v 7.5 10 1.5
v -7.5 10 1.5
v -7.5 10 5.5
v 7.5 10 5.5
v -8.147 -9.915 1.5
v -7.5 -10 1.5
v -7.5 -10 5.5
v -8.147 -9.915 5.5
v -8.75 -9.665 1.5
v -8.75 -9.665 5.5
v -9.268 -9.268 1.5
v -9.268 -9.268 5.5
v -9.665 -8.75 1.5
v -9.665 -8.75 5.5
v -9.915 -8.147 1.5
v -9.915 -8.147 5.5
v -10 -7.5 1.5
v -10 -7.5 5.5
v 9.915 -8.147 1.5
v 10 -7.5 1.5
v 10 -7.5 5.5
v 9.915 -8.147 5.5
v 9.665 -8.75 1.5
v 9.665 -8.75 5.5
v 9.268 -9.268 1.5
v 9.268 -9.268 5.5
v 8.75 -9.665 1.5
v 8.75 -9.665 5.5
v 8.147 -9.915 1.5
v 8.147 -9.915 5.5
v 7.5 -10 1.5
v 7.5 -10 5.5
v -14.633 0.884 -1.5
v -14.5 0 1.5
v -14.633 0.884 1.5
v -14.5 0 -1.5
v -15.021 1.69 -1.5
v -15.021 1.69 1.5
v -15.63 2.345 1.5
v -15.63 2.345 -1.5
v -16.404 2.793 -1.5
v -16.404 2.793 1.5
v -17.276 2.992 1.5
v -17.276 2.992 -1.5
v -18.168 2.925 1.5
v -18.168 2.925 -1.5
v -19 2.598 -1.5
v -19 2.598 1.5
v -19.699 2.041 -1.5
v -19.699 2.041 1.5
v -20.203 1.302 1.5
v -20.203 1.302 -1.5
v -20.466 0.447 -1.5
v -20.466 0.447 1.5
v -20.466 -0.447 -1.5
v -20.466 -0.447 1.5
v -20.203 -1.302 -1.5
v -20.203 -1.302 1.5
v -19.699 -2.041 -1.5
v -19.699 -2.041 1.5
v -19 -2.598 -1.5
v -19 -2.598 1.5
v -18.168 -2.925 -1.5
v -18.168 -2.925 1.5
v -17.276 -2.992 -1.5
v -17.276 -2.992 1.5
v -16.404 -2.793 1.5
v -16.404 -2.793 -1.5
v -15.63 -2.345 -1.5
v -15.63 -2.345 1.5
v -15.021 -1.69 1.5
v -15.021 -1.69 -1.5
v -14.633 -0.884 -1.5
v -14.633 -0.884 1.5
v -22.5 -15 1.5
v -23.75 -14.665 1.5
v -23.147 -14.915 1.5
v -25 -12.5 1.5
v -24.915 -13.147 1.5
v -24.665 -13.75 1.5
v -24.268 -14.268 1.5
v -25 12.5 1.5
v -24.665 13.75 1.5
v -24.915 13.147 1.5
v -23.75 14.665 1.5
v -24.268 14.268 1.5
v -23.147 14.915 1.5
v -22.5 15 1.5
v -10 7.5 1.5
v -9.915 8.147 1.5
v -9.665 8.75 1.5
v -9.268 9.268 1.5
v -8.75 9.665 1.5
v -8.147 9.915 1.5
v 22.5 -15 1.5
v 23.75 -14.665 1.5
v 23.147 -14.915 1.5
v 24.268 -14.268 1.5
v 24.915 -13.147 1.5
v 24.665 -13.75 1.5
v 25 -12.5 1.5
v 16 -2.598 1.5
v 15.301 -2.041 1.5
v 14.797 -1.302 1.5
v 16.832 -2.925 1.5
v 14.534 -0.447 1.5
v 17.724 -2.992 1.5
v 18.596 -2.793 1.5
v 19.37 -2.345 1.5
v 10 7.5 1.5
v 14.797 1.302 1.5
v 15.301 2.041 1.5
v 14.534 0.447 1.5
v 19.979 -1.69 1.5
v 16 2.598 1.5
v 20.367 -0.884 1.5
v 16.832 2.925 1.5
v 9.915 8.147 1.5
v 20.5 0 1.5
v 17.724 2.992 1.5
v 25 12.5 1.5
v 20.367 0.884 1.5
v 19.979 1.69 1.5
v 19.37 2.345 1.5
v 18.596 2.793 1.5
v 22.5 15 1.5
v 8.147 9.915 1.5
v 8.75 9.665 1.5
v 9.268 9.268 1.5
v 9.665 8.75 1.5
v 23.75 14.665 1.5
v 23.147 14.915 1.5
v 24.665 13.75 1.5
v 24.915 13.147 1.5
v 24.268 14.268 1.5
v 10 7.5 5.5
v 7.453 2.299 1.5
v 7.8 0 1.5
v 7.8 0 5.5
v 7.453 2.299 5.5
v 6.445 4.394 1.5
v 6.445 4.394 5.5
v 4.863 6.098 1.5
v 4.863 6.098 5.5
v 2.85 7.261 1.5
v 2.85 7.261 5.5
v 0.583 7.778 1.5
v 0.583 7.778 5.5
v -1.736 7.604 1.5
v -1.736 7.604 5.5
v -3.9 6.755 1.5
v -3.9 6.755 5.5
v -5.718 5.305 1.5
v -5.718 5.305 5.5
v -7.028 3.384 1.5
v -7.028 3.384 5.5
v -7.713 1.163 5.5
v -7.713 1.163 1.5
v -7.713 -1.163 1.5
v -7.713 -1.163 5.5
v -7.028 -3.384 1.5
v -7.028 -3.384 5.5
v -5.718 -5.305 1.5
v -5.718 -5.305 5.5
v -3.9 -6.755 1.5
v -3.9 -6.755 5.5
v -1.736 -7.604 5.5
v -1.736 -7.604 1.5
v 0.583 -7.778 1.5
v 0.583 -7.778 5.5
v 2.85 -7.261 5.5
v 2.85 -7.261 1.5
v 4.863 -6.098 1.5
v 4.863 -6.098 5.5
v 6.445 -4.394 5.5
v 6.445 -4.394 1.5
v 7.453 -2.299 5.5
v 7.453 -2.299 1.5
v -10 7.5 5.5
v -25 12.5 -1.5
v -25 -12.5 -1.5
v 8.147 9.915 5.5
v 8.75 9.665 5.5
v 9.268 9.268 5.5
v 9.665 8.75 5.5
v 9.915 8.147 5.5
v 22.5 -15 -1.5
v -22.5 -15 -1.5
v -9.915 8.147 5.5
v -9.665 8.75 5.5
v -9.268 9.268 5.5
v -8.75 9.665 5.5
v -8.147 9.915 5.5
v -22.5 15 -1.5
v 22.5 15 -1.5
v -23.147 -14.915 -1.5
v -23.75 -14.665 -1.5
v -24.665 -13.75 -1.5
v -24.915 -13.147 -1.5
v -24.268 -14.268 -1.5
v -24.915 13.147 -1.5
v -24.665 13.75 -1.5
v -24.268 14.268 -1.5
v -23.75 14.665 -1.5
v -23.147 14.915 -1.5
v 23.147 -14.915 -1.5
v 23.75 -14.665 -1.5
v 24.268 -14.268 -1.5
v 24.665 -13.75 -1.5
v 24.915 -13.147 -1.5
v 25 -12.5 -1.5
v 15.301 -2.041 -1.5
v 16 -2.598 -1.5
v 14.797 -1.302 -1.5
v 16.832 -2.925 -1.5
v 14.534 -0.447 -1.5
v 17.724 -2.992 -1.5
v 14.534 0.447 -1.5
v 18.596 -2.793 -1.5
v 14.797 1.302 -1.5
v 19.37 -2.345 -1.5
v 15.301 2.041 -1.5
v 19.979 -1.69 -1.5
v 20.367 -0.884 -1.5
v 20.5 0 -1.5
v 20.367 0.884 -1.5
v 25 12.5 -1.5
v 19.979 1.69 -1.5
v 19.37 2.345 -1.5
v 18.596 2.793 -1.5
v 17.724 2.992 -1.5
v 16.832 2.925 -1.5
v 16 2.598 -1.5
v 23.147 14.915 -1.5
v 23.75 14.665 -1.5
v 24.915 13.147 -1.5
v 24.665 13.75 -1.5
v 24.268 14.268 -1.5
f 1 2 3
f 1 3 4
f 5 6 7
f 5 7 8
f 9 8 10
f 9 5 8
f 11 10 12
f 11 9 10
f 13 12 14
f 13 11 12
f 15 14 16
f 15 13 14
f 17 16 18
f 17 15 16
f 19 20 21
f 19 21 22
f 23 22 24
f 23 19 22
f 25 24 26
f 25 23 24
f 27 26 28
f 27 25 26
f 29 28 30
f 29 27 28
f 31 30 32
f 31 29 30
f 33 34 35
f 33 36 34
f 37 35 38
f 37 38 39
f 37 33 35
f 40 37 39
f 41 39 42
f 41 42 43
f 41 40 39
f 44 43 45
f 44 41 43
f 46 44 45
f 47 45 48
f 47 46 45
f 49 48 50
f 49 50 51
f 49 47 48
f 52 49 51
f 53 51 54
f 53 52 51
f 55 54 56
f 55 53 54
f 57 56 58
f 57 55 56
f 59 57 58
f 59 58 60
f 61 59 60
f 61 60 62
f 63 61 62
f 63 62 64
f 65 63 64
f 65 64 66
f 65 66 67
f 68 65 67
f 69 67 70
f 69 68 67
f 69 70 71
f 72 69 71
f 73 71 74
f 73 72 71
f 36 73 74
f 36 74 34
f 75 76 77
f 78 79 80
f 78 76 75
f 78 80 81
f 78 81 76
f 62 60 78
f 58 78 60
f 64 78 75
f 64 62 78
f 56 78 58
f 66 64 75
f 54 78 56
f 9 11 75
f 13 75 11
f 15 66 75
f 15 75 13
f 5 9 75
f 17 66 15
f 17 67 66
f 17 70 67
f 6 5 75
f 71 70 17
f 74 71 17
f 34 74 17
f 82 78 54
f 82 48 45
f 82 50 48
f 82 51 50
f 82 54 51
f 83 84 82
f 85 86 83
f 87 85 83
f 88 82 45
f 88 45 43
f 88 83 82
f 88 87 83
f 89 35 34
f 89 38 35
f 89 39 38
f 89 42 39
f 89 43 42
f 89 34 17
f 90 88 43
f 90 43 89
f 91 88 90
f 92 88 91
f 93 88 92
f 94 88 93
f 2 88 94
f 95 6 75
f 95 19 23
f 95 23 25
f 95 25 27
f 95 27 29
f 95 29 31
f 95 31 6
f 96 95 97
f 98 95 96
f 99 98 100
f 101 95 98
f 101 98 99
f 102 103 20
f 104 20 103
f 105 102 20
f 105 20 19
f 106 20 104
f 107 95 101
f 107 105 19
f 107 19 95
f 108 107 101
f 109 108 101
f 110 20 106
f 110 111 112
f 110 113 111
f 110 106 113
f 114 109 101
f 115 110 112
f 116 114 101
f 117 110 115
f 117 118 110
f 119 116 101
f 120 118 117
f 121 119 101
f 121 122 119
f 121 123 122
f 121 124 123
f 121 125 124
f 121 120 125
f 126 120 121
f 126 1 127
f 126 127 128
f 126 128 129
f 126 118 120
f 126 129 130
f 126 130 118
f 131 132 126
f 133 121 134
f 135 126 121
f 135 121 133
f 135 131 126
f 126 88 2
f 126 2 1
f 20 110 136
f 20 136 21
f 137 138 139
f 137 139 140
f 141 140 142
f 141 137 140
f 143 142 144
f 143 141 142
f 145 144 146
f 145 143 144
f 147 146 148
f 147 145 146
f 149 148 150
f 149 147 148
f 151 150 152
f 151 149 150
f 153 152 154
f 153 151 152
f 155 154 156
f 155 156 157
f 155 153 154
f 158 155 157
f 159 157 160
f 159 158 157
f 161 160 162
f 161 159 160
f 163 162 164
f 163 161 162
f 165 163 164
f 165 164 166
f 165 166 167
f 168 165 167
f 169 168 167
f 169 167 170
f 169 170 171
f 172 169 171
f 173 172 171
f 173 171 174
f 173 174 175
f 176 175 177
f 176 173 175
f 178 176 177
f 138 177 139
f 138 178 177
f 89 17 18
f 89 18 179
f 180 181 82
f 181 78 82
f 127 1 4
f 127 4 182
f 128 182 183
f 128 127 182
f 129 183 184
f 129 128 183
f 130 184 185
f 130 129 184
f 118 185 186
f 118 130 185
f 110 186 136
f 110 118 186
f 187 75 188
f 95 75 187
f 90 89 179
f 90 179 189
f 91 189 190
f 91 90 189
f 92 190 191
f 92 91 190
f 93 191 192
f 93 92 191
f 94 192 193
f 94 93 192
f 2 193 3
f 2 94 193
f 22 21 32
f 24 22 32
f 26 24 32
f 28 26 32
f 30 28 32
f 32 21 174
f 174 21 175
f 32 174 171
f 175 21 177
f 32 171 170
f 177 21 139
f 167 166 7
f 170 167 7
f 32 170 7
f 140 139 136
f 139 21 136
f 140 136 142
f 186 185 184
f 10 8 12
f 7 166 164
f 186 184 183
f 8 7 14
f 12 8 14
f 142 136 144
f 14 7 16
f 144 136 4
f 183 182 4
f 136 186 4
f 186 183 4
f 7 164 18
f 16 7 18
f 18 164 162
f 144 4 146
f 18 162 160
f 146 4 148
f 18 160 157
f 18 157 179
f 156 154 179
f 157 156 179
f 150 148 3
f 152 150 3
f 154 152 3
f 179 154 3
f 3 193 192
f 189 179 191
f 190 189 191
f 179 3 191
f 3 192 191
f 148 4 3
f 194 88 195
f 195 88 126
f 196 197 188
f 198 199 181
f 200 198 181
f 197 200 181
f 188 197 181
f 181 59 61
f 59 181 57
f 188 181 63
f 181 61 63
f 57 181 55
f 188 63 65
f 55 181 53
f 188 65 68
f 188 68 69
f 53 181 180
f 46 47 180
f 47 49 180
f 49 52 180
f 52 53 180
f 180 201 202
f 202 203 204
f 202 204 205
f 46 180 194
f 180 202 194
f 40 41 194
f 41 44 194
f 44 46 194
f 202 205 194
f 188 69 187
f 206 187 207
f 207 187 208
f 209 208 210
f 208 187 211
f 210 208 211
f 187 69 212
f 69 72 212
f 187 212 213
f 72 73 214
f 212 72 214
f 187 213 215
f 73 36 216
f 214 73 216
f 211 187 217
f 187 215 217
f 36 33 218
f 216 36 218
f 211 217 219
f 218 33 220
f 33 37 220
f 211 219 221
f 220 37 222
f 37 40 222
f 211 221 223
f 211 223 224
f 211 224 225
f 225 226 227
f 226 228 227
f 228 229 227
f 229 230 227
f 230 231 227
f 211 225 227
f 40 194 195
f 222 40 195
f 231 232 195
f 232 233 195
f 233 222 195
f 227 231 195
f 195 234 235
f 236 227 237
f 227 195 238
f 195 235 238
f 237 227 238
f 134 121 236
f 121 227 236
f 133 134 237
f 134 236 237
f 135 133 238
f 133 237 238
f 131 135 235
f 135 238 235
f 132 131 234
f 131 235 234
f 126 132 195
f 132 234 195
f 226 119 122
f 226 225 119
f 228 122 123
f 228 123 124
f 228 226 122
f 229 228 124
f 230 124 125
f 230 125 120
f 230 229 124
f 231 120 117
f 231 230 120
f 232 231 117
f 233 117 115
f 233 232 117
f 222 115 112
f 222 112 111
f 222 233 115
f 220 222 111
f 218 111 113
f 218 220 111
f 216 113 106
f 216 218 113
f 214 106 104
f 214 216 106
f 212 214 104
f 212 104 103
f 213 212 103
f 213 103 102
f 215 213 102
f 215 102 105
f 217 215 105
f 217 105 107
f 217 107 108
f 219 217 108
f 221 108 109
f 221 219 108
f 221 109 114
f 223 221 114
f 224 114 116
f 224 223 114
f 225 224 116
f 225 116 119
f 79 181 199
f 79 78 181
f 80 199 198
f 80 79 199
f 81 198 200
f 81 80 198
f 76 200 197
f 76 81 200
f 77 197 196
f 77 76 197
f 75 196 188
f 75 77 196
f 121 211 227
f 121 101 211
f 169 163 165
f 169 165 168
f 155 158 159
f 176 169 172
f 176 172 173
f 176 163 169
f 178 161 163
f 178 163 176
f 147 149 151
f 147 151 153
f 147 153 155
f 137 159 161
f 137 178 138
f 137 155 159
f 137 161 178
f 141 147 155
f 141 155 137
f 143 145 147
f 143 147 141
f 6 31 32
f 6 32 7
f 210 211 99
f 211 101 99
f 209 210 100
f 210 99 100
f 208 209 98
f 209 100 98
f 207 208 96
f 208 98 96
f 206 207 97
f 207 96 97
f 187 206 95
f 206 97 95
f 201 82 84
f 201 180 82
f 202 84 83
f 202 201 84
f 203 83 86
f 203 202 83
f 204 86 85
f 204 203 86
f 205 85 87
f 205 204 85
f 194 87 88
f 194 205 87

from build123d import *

# Parameters (mm, degrees)
SKETCH1_W           = 50
SKETCH1_H           = 30
SKETCH1_R           = 3
BOSS_EXTRUDE1_DEPTH = 1.5
FILLET1_R           = 2.5
SKETCH2_R           = 7.8
BOSS_EXTRUDE2_DEPTH = 4


with BuildPart() as part:
    # Sketch1 → Boss-Extrude1 (new body, symmetric)
    with BuildSketch(Plane.XY):
        Rectangle(SKETCH1_W, SKETCH1_H)
        with Locations((-17.5, 0)):
            Circle(SKETCH1_R, mode=Mode.SUBTRACT)
        with Locations((17.5, 0)):
            Circle(SKETCH1_R, mode=Mode.SUBTRACT)
    extrude(amount=BOSS_EXTRUDE1_DEPTH, both=True)

    # Fillet1
    fillet1_edges = [part.edges().sort_by_distance(p)[0] for p in [
        (-25, 15, 0),
        (25, 15, 0),
        (25, -15, 0),
        (-25, -15, 0),
    ]]
    fillet(fillet1_edges, radius=FILLET1_R)

    # Sketch2 → Boss-Extrude2 (add)
    with BuildSketch(Plane.XY.offset(1.5)):
        with BuildLine():
            Line((7.5, -10), (-7.5, -10))
            ThreePointArc((-7.5, -10), (-9.267766953, -9.267766953), (-10, -7.5))
            Line((-10, -7.5), (-10, 7.5))
            ThreePointArc((-10, 7.5), (-9.267766953, 9.267766953), (-7.5, 10))
            Line((-7.5, 10), (7.5, 10))
            ThreePointArc((7.5, 10), (9.267766953, 9.267766953), (10, 7.5))
            Line((10, 7.5), (10, -7.5))
            ThreePointArc((10, -7.5), (9.267766953, -9.267766953), (7.5, -10))
        make_face()
        Circle(SKETCH2_R, mode=Mode.SUBTRACT)
    extrude(amount=BOSS_EXTRUDE2_DEPTH)


solid = part.part
